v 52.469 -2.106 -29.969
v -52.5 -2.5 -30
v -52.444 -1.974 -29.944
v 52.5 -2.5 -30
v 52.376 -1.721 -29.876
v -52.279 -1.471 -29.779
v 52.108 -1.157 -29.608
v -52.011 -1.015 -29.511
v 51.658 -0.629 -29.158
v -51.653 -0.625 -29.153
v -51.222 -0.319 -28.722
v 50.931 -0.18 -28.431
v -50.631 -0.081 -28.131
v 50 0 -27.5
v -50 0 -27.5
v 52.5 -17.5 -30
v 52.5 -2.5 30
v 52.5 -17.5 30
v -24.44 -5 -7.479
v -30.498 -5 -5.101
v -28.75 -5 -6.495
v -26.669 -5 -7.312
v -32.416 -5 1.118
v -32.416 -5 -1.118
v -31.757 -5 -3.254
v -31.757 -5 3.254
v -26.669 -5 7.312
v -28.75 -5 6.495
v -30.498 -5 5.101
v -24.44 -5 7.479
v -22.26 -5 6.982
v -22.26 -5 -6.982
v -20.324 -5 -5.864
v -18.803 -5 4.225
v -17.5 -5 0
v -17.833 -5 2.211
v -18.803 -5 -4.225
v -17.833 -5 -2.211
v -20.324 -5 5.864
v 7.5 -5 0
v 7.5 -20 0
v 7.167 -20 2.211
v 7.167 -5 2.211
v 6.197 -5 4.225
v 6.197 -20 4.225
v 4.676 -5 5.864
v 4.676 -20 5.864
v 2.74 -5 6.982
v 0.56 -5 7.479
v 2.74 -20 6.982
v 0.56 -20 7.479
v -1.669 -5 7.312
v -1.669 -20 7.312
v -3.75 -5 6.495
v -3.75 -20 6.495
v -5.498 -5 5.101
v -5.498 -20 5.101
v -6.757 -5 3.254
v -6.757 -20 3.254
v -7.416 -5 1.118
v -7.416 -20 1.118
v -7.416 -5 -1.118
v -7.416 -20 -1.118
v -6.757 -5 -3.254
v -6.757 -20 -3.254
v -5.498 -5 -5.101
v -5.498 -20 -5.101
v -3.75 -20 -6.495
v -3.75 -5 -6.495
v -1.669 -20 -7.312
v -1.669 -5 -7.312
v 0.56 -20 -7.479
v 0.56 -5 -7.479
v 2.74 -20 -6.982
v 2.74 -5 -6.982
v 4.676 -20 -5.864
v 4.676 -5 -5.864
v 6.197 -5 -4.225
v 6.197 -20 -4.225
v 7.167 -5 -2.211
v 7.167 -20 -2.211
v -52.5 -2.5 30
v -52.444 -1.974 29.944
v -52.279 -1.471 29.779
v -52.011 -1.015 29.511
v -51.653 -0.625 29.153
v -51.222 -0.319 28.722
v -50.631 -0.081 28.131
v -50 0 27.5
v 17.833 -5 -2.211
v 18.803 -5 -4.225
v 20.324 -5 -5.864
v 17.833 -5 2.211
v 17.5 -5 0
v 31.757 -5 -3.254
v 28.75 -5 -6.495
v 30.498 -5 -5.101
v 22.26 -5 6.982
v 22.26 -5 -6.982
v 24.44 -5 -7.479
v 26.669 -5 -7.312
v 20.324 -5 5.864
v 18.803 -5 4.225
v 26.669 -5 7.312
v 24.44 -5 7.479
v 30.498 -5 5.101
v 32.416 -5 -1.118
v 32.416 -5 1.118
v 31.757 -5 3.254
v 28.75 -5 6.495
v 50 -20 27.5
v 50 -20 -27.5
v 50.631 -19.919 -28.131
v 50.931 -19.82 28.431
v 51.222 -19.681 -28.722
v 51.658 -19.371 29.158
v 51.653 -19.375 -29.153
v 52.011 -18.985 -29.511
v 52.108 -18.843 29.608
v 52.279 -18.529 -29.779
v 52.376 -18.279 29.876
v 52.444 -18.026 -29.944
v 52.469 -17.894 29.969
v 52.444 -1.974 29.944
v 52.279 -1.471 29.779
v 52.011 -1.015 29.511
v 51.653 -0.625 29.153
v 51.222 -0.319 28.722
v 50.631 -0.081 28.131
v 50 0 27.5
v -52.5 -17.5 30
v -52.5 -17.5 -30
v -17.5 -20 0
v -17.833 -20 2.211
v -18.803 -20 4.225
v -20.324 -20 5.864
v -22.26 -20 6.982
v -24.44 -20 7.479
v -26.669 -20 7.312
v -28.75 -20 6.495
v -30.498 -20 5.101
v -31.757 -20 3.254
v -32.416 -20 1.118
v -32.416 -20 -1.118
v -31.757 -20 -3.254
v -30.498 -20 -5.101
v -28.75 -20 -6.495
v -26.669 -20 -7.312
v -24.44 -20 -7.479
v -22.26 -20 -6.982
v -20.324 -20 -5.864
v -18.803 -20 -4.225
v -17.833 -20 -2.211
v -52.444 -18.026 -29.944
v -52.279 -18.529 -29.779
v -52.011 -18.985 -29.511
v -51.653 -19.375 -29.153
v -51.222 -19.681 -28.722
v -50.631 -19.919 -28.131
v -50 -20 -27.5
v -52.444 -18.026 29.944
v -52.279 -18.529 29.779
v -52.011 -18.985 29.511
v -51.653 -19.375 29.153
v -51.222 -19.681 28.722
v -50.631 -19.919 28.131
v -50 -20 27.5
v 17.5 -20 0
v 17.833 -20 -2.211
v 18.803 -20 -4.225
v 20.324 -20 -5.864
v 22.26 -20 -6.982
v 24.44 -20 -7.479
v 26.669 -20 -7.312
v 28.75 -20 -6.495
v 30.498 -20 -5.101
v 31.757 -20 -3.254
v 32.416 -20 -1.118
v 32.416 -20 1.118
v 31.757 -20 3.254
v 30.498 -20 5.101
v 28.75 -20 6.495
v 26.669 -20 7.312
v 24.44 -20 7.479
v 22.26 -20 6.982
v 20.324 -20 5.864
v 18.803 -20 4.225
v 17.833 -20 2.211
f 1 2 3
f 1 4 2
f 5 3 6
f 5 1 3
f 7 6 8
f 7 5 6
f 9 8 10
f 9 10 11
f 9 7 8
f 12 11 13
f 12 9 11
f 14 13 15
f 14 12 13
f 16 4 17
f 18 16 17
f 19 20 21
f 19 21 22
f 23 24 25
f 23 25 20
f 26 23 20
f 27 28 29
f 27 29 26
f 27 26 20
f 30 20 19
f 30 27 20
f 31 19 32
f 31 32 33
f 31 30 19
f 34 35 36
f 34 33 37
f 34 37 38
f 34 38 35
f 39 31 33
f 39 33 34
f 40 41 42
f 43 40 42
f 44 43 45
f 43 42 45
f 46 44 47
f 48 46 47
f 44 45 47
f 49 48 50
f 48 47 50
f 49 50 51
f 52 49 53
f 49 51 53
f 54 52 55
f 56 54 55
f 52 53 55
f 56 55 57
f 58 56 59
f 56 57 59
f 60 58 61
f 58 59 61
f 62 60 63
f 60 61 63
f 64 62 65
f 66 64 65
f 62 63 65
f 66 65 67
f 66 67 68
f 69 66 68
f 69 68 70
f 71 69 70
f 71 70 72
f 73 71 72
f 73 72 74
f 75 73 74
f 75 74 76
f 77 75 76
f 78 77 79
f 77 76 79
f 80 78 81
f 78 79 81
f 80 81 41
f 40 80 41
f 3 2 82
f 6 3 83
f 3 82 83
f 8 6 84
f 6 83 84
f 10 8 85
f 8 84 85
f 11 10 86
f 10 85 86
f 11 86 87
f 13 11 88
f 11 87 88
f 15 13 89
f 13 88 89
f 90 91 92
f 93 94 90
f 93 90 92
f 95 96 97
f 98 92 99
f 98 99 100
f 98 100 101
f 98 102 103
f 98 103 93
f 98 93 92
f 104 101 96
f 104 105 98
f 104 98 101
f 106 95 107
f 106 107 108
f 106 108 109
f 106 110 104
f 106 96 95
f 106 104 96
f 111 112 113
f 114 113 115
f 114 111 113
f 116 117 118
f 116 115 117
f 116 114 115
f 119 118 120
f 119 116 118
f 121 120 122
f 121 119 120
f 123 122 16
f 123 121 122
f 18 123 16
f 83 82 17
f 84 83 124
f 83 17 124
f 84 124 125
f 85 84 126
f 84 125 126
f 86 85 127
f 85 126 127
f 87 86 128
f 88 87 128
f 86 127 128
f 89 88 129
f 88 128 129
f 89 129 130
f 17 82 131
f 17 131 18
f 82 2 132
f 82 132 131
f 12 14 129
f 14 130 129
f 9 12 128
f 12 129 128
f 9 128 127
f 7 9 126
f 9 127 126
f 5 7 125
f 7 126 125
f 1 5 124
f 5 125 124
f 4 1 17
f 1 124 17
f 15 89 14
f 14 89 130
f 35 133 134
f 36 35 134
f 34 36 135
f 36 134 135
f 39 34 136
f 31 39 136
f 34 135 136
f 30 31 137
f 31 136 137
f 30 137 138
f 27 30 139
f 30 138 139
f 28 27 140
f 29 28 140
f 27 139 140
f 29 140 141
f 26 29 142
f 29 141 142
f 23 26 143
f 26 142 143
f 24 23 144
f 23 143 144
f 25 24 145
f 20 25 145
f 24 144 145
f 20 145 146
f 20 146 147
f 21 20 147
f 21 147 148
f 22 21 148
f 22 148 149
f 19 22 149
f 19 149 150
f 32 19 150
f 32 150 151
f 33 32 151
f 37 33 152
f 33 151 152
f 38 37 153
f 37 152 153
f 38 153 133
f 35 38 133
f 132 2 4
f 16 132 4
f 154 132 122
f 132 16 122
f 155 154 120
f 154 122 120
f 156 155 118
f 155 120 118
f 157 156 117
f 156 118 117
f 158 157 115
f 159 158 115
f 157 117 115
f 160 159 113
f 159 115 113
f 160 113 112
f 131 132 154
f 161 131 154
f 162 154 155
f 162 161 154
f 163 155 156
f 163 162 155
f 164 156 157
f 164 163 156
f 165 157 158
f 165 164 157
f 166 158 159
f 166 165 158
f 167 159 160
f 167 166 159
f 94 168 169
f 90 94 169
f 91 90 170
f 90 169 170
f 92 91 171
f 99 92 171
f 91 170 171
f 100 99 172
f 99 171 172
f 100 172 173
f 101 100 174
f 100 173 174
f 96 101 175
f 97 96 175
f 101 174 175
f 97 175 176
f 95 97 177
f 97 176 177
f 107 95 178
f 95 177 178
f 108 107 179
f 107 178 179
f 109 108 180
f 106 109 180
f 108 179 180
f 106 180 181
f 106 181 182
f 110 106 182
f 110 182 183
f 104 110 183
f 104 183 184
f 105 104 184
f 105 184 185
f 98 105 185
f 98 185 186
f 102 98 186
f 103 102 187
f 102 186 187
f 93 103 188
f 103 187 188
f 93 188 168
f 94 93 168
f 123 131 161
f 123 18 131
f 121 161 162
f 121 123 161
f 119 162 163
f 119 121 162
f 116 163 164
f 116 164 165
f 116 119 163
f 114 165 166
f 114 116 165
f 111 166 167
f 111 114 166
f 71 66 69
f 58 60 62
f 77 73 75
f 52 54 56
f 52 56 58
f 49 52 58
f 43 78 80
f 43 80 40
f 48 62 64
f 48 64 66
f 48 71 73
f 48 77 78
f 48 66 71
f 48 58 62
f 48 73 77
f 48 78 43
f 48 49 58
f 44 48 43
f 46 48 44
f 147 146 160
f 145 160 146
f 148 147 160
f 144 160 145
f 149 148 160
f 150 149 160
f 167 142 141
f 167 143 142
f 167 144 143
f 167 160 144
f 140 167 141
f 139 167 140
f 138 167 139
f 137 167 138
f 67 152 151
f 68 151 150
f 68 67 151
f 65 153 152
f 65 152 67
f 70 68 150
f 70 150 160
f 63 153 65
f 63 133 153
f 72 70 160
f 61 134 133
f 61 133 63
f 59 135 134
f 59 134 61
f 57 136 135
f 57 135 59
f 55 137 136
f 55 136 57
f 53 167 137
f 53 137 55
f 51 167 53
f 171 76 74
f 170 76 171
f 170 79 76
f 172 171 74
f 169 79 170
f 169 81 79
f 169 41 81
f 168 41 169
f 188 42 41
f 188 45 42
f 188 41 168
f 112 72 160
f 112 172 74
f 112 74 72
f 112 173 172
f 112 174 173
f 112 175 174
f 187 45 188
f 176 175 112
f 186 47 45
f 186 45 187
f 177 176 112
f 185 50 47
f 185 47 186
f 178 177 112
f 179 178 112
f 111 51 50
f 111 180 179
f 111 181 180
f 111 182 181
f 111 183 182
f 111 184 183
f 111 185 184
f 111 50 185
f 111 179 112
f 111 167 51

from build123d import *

# Parameters (mm, degrees)
F0_W     = 105
F0_H     = 60
F1_DEPTH = 20
F2_R     = 7.5
F3_DEPTH = 15
F4_R     = 2.5


with BuildPart() as f1:
    # F0 (on Front) → F1 (new body)
    with BuildSketch(Plane.XZ):
        Rectangle(F0_W, F0_H)
    extrude(amount=F1_DEPTH)

    # F2 (on face) → F3 (cut)
    with BuildSketch(Plane.XZ.offset(20)):
        with BuildLine():
            ThreePointArc((-7.5, 0), (0, -7.5), (7.5, 0))
            ThreePointArc((7.5, 0), (0, 7.5), (-7.5, 0))
        make_face()
        with Locations((-25, 0)):
            Circle(F2_R)
        with BuildLine():
            ThreePointArc((32.5, 0), (25, 7.5), (17.5, 0))
            ThreePointArc((17.5, 0), (25, -7.5), (32.5, 0))
        make_face()
    extrude(amount=-F3_DEPTH, mode=Mode.SUBTRACT)

    # F4
    f4_edges = [f1.edges().sort_by_distance(p)[0] for p in [
        (-52.5, -20, 0),
        (0, -20, -30),
        (52.5, -20, 0),
        (0, -20, 30),
        (-52.5, 0, 0),
        (0, 0, 30),
        (52.5, 0, 0),
        (0, 0, -30),
    ]]
    fillet(f4_edges, radius=F4_R)


solid = f1.part
